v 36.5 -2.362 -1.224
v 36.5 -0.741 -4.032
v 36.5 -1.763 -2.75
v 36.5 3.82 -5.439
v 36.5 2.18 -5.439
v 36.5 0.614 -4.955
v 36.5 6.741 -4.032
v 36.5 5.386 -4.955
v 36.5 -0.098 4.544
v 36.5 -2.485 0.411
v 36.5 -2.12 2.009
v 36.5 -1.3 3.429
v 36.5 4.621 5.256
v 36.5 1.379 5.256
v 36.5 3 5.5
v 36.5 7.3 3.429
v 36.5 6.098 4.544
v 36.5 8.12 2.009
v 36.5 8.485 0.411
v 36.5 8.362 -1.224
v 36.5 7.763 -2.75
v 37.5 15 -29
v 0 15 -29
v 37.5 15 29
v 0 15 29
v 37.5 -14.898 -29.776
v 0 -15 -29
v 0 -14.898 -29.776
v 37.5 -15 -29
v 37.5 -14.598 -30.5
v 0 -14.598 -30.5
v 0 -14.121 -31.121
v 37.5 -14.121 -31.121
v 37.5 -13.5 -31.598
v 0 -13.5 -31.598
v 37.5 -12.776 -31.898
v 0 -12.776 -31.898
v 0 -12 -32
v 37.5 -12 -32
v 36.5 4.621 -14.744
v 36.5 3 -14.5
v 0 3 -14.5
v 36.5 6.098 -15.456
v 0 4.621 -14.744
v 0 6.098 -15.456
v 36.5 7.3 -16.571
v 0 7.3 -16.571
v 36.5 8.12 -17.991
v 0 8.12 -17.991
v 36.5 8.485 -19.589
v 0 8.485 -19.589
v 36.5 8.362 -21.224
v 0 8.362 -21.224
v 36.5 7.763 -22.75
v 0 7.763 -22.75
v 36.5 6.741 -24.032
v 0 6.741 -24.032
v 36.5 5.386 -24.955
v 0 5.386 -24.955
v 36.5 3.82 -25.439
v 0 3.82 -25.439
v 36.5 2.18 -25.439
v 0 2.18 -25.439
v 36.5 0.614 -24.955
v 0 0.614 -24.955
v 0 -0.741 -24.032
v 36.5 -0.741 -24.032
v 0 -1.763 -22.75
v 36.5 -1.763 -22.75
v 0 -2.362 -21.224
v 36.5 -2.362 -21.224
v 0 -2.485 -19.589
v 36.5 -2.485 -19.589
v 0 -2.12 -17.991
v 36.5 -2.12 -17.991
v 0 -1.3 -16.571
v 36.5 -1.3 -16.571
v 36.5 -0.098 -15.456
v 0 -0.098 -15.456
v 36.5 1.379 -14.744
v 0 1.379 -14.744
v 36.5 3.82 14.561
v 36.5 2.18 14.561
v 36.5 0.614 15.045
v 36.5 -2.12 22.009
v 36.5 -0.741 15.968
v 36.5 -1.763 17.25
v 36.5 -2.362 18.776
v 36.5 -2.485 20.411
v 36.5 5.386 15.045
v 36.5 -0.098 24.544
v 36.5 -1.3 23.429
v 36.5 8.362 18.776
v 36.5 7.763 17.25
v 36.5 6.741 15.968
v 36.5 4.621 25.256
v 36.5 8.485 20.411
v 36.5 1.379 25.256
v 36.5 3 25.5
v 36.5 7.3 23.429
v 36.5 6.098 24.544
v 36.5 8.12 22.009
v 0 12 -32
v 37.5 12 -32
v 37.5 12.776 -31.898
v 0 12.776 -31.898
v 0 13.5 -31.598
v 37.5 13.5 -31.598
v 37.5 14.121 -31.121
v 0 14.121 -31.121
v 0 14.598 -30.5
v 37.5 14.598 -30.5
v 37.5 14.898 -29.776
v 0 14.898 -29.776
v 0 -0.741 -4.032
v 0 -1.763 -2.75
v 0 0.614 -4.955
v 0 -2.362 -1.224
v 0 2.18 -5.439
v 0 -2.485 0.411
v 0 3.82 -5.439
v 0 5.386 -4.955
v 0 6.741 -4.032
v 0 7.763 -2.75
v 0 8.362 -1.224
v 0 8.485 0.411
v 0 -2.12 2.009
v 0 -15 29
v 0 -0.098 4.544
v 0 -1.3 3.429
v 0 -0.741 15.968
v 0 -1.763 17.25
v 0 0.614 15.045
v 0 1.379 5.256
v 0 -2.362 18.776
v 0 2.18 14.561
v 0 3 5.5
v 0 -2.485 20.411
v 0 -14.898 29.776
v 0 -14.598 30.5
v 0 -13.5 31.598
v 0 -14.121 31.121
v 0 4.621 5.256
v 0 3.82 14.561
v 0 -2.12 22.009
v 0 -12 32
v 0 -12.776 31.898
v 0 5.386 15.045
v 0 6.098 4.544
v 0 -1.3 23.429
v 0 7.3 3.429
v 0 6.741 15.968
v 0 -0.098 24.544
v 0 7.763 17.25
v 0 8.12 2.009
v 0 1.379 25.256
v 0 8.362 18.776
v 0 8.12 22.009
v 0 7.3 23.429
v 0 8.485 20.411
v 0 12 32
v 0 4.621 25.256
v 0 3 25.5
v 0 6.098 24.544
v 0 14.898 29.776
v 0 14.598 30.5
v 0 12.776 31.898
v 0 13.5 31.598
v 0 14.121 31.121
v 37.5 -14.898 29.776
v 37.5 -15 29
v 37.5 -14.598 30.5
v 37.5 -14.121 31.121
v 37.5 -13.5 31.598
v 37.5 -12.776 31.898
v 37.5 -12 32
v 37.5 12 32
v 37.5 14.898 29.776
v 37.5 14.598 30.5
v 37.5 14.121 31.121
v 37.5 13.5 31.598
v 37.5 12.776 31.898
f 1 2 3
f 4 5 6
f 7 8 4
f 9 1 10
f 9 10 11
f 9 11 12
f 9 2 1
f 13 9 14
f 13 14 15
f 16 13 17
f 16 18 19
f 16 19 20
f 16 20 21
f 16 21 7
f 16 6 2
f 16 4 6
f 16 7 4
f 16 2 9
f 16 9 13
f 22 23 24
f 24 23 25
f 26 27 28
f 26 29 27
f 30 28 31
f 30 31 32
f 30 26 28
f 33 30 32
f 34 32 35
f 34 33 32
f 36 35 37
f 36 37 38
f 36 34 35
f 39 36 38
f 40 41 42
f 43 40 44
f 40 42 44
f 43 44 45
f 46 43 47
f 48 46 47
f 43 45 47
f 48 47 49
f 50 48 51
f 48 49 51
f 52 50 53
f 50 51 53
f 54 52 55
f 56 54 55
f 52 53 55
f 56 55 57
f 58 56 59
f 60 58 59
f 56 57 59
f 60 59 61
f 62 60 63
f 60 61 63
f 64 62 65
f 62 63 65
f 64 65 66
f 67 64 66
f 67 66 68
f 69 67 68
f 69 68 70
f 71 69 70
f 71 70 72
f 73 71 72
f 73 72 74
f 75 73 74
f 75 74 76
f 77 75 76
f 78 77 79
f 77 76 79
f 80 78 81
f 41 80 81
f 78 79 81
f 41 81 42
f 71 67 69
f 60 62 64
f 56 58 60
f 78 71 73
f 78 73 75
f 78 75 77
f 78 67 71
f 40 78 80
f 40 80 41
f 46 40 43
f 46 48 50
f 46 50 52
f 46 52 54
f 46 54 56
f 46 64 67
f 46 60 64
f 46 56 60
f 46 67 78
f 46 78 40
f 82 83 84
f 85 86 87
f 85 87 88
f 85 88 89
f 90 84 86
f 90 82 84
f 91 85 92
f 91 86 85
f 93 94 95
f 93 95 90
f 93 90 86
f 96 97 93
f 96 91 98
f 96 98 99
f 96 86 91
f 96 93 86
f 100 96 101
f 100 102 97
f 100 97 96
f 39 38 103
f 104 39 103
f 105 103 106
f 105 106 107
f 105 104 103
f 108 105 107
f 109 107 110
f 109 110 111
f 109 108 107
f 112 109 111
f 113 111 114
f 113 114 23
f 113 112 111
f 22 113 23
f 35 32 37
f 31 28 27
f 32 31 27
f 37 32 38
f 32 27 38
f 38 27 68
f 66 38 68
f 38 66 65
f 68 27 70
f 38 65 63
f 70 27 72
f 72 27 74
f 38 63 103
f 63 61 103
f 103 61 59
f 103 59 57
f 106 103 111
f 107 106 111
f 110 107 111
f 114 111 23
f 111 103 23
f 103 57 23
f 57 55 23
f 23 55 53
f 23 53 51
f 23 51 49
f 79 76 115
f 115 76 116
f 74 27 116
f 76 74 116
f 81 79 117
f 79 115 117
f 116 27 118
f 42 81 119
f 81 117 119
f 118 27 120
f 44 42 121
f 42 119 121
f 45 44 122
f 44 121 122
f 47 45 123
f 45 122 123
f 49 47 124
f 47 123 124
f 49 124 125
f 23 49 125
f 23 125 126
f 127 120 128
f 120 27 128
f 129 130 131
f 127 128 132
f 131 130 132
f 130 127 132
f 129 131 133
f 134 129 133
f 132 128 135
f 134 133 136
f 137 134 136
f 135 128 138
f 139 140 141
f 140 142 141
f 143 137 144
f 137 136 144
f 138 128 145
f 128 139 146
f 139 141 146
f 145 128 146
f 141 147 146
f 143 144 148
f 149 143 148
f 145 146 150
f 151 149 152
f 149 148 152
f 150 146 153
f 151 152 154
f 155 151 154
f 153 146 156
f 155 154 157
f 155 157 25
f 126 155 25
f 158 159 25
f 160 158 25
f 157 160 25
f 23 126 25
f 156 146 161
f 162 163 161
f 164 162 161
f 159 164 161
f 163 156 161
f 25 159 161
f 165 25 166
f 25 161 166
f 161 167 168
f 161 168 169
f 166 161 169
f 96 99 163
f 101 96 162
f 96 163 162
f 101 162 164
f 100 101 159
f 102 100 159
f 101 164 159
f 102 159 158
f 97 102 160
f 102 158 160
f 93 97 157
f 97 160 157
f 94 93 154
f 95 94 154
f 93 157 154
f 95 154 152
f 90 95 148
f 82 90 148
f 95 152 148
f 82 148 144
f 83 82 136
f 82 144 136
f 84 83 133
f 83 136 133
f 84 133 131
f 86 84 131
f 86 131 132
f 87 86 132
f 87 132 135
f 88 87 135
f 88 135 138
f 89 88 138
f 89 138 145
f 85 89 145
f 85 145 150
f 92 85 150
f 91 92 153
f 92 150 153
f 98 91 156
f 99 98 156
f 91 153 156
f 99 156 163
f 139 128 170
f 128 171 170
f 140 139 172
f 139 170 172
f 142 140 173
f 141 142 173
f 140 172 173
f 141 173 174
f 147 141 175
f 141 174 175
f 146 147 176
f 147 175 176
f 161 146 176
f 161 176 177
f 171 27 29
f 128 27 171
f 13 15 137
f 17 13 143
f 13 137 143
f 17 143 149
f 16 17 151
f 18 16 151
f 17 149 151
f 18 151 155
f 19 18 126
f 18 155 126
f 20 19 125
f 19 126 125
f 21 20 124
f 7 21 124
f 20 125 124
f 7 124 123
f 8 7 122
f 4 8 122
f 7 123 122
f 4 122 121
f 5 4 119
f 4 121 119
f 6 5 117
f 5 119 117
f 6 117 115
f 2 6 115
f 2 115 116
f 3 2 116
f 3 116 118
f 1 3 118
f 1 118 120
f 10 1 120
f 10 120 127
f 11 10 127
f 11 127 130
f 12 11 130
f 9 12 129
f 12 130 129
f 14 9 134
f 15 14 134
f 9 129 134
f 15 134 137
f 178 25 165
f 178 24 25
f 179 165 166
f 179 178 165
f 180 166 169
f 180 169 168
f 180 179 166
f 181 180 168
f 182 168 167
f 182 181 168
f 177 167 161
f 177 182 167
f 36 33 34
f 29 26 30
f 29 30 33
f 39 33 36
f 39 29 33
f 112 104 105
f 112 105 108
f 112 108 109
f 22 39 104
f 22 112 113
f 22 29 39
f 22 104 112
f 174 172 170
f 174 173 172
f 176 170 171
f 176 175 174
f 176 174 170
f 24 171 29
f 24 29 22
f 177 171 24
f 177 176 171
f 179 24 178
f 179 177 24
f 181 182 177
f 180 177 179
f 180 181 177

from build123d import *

# Parameters (mm, degrees)
SKETCH1_W       = 30
SKETCH1_H       = 64
BLOCK_DEPTH     = 37.5
BLOCKFILLET_R   = 3
SKETCH2_R       = 5.5
JACKHOLES_DEPTH = 36.5


with BuildPart() as part:
    # Sketch1 → Block (new body)
    with BuildSketch(Plane.YZ):
        Rectangle(SKETCH1_W, SKETCH1_H)
    extrude(amount=BLOCK_DEPTH)

    # BlockFillet
    blockfillet_edges = [part.edges().sort_by_distance(p)[0] for p in [
        (18.75, -15, 32),
        (18.75, 15, 32),
        (18.75, 15, -32),
        (18.75, -15, -32),
    ]]
    fillet(blockfillet_edges, radius=BLOCKFILLET_R)

    # Sketch2 → JackHoles (cut)
    with BuildSketch(Plane(origin=(0, 0, 0), x_dir=(0, -1, 0), z_dir=(-1, 0, 0))):
        with Locations(Location((-3, -20, 0), (0, 0, 90))):
            Circle(SKETCH2_R)
        with Locations(Location((-3, 0, 0), (0, 0, 90))):
            Circle(SKETCH2_R)
        with Locations(Location((-3, 20, 0), (0, 0, 90))):
            Circle(SKETCH2_R)
    extrude(amount=-JACKHOLES_DEPTH, mode=Mode.SUBTRACT)


solid = part.part
